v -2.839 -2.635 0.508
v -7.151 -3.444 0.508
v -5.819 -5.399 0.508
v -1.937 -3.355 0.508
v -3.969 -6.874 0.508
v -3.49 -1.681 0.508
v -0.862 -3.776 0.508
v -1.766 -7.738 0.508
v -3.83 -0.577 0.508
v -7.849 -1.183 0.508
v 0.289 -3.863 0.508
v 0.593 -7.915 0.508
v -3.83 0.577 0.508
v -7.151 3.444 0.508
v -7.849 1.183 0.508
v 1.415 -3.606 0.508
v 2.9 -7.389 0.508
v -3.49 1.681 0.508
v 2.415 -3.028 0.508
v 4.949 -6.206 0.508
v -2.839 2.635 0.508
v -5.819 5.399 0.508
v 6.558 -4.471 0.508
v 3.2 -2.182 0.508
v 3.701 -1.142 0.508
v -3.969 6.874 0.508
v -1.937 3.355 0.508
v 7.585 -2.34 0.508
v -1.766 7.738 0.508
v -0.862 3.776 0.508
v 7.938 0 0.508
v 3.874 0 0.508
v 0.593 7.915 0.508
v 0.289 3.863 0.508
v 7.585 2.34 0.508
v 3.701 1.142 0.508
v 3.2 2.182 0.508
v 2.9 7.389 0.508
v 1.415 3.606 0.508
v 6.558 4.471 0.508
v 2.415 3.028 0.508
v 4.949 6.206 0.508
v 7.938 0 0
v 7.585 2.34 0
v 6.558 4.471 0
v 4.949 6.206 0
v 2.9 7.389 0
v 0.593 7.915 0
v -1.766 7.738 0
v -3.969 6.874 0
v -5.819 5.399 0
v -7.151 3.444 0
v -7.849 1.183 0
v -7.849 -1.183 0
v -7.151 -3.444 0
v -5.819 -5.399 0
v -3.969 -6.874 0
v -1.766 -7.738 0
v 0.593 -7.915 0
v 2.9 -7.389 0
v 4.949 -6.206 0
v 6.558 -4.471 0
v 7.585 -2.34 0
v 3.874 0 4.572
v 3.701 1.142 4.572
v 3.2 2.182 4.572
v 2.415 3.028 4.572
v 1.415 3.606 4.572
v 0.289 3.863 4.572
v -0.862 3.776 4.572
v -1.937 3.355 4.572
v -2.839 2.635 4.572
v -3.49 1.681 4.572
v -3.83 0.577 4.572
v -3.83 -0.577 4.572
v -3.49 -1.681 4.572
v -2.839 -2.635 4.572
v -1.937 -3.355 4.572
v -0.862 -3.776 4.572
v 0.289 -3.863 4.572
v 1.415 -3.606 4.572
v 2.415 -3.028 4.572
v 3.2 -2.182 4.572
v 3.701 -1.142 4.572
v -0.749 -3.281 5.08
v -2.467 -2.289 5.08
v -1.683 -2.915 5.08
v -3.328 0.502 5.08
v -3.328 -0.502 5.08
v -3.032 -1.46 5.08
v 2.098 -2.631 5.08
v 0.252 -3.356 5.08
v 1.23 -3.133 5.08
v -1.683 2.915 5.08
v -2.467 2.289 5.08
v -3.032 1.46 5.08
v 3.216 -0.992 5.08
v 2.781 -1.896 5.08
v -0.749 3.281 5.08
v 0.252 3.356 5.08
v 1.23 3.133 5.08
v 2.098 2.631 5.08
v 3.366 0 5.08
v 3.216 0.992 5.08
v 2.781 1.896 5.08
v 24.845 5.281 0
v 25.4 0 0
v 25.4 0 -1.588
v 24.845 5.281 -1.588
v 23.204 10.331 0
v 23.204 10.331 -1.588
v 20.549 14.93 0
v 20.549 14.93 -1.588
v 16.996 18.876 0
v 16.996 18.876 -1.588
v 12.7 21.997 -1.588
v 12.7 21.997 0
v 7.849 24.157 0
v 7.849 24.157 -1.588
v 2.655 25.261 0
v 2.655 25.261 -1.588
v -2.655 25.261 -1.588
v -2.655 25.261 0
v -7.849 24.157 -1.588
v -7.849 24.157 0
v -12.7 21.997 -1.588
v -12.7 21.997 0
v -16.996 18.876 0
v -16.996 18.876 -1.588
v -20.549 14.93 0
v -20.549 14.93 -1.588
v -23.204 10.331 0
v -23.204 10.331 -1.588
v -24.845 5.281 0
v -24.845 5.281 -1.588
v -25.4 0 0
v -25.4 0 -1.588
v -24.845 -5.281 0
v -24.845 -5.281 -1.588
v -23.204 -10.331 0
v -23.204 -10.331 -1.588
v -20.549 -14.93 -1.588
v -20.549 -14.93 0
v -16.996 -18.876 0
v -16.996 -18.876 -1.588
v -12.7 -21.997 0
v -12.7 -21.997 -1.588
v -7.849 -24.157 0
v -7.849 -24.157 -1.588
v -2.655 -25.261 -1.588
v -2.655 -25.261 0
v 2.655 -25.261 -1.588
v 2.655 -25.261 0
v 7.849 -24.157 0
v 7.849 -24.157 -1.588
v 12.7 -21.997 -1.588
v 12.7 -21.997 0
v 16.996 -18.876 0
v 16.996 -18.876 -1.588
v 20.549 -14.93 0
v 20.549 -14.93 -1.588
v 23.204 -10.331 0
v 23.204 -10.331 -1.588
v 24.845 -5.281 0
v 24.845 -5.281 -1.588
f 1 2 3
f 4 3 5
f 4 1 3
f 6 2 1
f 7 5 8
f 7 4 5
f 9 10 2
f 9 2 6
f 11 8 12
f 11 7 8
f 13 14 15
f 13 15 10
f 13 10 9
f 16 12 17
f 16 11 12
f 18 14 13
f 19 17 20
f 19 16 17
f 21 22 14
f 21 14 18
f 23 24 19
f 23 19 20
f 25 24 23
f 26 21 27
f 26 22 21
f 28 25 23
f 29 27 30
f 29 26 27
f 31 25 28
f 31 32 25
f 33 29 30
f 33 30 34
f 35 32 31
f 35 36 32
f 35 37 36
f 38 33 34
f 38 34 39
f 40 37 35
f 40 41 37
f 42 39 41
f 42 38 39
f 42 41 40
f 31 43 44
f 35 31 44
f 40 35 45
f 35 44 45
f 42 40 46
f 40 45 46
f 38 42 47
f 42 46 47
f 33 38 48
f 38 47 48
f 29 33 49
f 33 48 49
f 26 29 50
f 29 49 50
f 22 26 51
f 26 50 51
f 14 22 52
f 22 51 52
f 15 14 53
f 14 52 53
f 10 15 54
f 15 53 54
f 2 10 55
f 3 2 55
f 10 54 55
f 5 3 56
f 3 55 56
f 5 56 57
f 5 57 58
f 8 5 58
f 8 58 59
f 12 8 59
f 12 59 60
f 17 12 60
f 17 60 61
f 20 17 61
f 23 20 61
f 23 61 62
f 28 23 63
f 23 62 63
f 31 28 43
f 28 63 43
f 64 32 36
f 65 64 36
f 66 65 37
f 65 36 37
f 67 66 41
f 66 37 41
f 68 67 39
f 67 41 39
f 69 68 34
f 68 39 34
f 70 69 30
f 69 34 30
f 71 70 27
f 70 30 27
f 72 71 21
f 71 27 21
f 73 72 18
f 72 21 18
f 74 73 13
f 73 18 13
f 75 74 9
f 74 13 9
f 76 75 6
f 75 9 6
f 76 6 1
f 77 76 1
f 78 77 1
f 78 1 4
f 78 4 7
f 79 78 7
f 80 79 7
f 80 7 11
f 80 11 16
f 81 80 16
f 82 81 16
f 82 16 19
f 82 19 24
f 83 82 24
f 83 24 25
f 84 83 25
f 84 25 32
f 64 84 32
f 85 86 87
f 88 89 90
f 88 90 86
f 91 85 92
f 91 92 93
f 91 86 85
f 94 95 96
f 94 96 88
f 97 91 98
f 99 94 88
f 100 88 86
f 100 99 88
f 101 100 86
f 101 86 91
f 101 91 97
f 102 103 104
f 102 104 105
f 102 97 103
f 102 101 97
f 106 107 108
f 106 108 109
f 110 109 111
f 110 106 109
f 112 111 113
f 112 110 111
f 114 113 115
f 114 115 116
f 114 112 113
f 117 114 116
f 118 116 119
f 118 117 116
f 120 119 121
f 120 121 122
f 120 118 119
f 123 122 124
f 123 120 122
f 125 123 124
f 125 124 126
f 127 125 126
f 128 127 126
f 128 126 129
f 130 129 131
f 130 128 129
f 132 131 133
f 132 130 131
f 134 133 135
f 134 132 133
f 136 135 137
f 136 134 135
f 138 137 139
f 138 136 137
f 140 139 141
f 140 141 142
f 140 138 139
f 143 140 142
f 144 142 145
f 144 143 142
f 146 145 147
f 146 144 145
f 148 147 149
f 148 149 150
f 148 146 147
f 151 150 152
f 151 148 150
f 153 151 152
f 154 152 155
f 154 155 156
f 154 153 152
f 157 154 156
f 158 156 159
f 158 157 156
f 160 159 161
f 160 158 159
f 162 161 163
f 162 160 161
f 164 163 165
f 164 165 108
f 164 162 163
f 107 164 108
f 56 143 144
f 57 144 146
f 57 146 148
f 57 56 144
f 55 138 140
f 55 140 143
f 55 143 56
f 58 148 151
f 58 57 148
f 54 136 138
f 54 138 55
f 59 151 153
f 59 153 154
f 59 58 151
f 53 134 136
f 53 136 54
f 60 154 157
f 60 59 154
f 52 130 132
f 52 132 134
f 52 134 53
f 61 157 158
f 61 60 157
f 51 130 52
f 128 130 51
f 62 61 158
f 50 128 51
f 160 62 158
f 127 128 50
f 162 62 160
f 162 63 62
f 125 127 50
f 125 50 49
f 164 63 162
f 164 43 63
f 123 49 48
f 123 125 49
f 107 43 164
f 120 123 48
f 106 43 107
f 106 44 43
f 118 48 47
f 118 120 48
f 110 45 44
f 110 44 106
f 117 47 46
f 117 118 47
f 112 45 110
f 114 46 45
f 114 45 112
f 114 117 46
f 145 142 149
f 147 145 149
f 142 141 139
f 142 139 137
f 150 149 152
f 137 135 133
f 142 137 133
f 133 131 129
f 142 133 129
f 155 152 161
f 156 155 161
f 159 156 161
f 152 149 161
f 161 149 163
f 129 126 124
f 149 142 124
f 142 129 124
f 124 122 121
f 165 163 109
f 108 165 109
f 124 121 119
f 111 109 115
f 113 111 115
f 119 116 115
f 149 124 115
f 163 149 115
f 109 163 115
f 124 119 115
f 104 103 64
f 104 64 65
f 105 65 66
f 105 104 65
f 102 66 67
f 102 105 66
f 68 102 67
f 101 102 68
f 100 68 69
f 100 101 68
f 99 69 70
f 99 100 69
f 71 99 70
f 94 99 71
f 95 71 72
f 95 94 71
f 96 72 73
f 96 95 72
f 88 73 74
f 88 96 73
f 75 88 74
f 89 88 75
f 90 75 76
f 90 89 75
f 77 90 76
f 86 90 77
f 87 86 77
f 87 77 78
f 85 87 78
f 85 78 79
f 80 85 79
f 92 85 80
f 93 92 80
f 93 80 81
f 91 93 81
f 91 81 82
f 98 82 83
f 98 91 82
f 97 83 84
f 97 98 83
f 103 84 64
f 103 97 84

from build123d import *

# Parameters (mm, degrees)
F0_R     = 25.4
F0_R_2   = 7.9375
F0_R_3   = 3.8735
F1_DEPTH = 1.5875
F2_DEPTH = 5.08
F3_SIZE  = 0.508
F4_DEPTH = 0.508


with BuildPart() as f1:
    # F0 (on Top) → F1 (new body)
    with BuildSketch(Plane.XY):
        Circle(F0_R)
        Circle(F0_R_2, mode=Mode.SUBTRACT)
        Circle(F0_R_2)
        Circle(F0_R_3, mode=Mode.SUBTRACT)
        Circle(F0_R_3)
    extrude(amount=-F1_DEPTH)

    # F0 (on Top) → F2 (join)
    with BuildSketch(Plane.XY):
        Circle(F0_R_3)
    extrude(amount=F2_DEPTH)

    # F3
    f3_edges = [f1.edges().sort_by_distance(p)[0] for p in [
        (-3.8735, 0, 5.08),
    ]]
    chamfer(f3_edges, length=F3_SIZE)

    # F0 (on Top) → F4 (join)
    with BuildSketch(Plane.XY):
        Circle(F0_R_2)
        Circle(F0_R_3, mode=Mode.SUBTRACT)
    extrude(amount=F4_DEPTH)


solid = f1.part
